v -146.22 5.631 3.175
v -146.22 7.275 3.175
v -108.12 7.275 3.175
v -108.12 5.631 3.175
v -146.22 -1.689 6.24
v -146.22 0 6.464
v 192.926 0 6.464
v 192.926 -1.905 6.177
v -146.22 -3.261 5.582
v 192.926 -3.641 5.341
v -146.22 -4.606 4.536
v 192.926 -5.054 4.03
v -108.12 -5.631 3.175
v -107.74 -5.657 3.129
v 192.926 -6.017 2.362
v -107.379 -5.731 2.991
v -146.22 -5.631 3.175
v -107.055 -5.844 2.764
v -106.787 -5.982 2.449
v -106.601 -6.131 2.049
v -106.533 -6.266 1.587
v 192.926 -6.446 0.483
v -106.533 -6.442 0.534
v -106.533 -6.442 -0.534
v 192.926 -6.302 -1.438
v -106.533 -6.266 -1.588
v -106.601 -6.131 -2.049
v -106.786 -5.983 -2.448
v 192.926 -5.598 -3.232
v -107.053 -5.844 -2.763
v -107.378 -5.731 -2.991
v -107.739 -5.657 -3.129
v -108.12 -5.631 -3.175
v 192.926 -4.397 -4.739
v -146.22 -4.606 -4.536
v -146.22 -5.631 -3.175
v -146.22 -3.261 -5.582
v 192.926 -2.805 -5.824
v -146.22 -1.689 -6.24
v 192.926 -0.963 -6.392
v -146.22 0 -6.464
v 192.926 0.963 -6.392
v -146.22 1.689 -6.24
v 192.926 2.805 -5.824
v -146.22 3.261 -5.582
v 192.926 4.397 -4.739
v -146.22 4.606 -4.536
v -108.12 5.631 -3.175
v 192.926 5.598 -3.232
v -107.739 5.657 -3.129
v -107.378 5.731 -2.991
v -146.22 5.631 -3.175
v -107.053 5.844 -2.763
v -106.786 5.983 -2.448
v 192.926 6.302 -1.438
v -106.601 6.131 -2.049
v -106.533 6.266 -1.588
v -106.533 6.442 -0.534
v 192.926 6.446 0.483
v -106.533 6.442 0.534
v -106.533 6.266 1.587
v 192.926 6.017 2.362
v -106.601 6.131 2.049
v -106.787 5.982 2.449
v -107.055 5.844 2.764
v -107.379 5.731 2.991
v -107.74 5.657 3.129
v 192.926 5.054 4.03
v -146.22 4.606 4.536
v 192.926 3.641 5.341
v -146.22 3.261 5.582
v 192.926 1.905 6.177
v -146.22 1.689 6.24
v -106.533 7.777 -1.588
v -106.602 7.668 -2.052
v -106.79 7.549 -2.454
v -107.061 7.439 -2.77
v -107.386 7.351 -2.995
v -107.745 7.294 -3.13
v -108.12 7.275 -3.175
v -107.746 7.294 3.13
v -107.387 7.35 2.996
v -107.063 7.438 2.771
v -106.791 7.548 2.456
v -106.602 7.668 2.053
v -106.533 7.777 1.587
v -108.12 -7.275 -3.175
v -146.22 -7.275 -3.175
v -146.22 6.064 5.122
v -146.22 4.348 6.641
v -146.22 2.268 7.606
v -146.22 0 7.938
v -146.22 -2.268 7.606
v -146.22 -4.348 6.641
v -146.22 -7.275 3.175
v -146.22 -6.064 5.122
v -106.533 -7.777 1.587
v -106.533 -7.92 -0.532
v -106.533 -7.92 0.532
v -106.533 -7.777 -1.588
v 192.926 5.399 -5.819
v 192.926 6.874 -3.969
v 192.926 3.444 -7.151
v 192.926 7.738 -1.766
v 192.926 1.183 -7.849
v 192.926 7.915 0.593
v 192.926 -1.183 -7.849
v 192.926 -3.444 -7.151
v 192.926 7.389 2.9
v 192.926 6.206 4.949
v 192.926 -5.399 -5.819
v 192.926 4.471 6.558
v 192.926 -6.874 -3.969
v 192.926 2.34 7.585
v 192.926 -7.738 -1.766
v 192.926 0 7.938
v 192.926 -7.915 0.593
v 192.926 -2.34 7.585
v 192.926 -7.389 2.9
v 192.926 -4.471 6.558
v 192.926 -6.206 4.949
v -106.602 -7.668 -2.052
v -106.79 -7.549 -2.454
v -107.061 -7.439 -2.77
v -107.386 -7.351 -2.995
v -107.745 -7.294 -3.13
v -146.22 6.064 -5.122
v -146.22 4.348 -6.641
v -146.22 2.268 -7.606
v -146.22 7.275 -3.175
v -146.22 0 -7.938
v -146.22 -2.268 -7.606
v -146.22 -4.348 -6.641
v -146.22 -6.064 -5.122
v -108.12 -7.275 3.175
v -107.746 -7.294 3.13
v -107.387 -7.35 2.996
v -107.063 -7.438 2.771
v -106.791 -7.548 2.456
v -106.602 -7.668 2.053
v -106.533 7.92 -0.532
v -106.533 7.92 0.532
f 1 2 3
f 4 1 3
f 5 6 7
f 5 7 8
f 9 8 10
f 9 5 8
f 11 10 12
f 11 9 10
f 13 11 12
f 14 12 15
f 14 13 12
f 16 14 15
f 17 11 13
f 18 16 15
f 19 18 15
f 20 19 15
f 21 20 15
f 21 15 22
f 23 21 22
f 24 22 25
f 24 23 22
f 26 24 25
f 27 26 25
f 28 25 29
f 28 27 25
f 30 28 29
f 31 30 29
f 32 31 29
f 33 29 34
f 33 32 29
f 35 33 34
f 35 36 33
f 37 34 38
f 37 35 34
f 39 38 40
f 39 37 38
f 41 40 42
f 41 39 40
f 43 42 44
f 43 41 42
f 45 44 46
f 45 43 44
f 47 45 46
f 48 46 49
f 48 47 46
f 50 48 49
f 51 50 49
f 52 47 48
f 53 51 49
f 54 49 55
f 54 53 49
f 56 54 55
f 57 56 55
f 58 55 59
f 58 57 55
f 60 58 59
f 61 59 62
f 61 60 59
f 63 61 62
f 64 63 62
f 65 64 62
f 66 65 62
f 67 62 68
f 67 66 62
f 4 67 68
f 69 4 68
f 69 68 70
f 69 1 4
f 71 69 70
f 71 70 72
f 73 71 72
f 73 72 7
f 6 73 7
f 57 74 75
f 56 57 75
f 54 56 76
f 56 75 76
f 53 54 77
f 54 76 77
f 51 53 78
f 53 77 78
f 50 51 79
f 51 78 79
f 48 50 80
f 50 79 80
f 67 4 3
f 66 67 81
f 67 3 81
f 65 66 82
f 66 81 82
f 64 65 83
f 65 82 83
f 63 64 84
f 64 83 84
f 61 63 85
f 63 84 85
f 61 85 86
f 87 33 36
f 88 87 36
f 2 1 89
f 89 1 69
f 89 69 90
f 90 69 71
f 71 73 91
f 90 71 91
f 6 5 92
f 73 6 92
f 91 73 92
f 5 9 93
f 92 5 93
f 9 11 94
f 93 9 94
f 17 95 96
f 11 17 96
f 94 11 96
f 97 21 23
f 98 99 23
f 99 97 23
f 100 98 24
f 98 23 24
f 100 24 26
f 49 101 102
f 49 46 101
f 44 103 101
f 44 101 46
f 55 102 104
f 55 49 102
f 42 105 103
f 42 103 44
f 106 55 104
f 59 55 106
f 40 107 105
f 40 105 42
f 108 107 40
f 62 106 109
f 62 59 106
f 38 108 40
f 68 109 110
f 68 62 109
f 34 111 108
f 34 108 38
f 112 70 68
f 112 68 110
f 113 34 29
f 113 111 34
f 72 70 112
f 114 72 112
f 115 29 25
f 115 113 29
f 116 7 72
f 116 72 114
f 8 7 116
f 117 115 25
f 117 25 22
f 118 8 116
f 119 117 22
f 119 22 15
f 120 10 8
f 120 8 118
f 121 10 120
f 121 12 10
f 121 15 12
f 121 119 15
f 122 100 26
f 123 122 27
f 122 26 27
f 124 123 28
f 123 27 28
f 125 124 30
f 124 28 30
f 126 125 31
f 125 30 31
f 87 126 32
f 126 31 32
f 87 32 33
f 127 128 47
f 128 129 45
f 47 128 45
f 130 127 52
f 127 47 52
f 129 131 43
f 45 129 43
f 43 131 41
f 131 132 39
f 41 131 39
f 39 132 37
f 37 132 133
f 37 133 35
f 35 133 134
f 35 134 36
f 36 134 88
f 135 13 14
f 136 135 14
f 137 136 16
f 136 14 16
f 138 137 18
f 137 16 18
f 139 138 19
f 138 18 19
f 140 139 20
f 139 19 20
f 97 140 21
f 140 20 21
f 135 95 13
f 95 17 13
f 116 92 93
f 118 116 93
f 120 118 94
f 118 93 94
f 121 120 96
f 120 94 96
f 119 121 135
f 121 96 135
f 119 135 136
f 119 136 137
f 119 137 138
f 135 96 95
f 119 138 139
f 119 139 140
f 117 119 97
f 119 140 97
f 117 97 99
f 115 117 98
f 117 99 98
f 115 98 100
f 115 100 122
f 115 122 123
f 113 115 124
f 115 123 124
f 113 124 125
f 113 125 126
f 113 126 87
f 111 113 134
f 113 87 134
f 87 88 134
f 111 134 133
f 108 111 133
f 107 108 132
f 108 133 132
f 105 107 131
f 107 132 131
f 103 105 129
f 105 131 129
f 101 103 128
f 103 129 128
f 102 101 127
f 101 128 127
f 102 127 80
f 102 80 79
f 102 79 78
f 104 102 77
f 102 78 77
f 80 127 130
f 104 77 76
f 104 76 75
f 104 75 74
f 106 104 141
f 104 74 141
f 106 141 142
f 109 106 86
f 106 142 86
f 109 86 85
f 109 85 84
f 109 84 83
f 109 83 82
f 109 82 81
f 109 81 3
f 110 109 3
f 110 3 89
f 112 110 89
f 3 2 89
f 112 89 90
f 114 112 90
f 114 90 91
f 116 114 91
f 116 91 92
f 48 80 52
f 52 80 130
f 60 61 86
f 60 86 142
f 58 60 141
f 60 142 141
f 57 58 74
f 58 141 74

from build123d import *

# Parameters (mm, degrees)
BOSS_EXTRUDE1_DEPTH      = 192.925743
BOSS_EXTRUDE1_DEPTH_BACK = 146.220291
SKETCH1_R                = 7.9375
SKETCH1_R_2              = 6.4643
CUT_EXTRUDE1_DEPTH       = 331.187461377


with BuildPart() as part:
    # Sketch1 → Boss-Extrude1 (new, two sides: drawn at the far end of the back side and taken through both)
    with BuildSketch(Plane(origin=(0, 0, 0), x_dir=(0, 0, -1), z_dir=(1, 0, 0)).offset(-BOSS_EXTRUDE1_DEPTH_BACK)):
        with Locations(Location((0, 0, 0), (0, 0, 180))):
            Circle(SKETCH1_R)
        with Locations(Location((0, 0, 0), (0, 0, 180))):
            Circle(SKETCH1_R_2, mode=Mode.SUBTRACT)
    extrude(amount=BOSS_EXTRUDE1_DEPTH + BOSS_EXTRUDE1_DEPTH_BACK)

    # Sketch2 → Cut-Extrude1 (cut, through all)
    with BuildSketch(Plane(origin=(179.090362215, 7.9375, -46.327801352), x_dir=(0.11485518524691138, 0, -0.9933822458761269), z_dir=(0, 1, 0))):
        with BuildLine():
            Line((-86.538819377, 317.472174359), (-82.162836819, 279.624310791))
            ThreePointArc((-82.162836819, 279.624310791), (-81.572017256, 278.562611401), (-80.403509897, 278.229649083))
            Line((-80.403509897, 278.229649083), (-77.249521267, 278.594314296))
            ThreePointArc((-77.249521267, 278.594314296), (-76.187821877, 279.185133859), (-75.854859558, 280.353641218))
            Line((-75.854859558, 280.353641218), (-80.230842116, 318.201504786))
            Line((-80.230842116, 318.201504786), (-86.538819377, 317.472174359))
        make_face()
    extrude(amount=-CUT_EXTRUDE1_DEPTH, mode=Mode.SUBTRACT)


solid = part.part
